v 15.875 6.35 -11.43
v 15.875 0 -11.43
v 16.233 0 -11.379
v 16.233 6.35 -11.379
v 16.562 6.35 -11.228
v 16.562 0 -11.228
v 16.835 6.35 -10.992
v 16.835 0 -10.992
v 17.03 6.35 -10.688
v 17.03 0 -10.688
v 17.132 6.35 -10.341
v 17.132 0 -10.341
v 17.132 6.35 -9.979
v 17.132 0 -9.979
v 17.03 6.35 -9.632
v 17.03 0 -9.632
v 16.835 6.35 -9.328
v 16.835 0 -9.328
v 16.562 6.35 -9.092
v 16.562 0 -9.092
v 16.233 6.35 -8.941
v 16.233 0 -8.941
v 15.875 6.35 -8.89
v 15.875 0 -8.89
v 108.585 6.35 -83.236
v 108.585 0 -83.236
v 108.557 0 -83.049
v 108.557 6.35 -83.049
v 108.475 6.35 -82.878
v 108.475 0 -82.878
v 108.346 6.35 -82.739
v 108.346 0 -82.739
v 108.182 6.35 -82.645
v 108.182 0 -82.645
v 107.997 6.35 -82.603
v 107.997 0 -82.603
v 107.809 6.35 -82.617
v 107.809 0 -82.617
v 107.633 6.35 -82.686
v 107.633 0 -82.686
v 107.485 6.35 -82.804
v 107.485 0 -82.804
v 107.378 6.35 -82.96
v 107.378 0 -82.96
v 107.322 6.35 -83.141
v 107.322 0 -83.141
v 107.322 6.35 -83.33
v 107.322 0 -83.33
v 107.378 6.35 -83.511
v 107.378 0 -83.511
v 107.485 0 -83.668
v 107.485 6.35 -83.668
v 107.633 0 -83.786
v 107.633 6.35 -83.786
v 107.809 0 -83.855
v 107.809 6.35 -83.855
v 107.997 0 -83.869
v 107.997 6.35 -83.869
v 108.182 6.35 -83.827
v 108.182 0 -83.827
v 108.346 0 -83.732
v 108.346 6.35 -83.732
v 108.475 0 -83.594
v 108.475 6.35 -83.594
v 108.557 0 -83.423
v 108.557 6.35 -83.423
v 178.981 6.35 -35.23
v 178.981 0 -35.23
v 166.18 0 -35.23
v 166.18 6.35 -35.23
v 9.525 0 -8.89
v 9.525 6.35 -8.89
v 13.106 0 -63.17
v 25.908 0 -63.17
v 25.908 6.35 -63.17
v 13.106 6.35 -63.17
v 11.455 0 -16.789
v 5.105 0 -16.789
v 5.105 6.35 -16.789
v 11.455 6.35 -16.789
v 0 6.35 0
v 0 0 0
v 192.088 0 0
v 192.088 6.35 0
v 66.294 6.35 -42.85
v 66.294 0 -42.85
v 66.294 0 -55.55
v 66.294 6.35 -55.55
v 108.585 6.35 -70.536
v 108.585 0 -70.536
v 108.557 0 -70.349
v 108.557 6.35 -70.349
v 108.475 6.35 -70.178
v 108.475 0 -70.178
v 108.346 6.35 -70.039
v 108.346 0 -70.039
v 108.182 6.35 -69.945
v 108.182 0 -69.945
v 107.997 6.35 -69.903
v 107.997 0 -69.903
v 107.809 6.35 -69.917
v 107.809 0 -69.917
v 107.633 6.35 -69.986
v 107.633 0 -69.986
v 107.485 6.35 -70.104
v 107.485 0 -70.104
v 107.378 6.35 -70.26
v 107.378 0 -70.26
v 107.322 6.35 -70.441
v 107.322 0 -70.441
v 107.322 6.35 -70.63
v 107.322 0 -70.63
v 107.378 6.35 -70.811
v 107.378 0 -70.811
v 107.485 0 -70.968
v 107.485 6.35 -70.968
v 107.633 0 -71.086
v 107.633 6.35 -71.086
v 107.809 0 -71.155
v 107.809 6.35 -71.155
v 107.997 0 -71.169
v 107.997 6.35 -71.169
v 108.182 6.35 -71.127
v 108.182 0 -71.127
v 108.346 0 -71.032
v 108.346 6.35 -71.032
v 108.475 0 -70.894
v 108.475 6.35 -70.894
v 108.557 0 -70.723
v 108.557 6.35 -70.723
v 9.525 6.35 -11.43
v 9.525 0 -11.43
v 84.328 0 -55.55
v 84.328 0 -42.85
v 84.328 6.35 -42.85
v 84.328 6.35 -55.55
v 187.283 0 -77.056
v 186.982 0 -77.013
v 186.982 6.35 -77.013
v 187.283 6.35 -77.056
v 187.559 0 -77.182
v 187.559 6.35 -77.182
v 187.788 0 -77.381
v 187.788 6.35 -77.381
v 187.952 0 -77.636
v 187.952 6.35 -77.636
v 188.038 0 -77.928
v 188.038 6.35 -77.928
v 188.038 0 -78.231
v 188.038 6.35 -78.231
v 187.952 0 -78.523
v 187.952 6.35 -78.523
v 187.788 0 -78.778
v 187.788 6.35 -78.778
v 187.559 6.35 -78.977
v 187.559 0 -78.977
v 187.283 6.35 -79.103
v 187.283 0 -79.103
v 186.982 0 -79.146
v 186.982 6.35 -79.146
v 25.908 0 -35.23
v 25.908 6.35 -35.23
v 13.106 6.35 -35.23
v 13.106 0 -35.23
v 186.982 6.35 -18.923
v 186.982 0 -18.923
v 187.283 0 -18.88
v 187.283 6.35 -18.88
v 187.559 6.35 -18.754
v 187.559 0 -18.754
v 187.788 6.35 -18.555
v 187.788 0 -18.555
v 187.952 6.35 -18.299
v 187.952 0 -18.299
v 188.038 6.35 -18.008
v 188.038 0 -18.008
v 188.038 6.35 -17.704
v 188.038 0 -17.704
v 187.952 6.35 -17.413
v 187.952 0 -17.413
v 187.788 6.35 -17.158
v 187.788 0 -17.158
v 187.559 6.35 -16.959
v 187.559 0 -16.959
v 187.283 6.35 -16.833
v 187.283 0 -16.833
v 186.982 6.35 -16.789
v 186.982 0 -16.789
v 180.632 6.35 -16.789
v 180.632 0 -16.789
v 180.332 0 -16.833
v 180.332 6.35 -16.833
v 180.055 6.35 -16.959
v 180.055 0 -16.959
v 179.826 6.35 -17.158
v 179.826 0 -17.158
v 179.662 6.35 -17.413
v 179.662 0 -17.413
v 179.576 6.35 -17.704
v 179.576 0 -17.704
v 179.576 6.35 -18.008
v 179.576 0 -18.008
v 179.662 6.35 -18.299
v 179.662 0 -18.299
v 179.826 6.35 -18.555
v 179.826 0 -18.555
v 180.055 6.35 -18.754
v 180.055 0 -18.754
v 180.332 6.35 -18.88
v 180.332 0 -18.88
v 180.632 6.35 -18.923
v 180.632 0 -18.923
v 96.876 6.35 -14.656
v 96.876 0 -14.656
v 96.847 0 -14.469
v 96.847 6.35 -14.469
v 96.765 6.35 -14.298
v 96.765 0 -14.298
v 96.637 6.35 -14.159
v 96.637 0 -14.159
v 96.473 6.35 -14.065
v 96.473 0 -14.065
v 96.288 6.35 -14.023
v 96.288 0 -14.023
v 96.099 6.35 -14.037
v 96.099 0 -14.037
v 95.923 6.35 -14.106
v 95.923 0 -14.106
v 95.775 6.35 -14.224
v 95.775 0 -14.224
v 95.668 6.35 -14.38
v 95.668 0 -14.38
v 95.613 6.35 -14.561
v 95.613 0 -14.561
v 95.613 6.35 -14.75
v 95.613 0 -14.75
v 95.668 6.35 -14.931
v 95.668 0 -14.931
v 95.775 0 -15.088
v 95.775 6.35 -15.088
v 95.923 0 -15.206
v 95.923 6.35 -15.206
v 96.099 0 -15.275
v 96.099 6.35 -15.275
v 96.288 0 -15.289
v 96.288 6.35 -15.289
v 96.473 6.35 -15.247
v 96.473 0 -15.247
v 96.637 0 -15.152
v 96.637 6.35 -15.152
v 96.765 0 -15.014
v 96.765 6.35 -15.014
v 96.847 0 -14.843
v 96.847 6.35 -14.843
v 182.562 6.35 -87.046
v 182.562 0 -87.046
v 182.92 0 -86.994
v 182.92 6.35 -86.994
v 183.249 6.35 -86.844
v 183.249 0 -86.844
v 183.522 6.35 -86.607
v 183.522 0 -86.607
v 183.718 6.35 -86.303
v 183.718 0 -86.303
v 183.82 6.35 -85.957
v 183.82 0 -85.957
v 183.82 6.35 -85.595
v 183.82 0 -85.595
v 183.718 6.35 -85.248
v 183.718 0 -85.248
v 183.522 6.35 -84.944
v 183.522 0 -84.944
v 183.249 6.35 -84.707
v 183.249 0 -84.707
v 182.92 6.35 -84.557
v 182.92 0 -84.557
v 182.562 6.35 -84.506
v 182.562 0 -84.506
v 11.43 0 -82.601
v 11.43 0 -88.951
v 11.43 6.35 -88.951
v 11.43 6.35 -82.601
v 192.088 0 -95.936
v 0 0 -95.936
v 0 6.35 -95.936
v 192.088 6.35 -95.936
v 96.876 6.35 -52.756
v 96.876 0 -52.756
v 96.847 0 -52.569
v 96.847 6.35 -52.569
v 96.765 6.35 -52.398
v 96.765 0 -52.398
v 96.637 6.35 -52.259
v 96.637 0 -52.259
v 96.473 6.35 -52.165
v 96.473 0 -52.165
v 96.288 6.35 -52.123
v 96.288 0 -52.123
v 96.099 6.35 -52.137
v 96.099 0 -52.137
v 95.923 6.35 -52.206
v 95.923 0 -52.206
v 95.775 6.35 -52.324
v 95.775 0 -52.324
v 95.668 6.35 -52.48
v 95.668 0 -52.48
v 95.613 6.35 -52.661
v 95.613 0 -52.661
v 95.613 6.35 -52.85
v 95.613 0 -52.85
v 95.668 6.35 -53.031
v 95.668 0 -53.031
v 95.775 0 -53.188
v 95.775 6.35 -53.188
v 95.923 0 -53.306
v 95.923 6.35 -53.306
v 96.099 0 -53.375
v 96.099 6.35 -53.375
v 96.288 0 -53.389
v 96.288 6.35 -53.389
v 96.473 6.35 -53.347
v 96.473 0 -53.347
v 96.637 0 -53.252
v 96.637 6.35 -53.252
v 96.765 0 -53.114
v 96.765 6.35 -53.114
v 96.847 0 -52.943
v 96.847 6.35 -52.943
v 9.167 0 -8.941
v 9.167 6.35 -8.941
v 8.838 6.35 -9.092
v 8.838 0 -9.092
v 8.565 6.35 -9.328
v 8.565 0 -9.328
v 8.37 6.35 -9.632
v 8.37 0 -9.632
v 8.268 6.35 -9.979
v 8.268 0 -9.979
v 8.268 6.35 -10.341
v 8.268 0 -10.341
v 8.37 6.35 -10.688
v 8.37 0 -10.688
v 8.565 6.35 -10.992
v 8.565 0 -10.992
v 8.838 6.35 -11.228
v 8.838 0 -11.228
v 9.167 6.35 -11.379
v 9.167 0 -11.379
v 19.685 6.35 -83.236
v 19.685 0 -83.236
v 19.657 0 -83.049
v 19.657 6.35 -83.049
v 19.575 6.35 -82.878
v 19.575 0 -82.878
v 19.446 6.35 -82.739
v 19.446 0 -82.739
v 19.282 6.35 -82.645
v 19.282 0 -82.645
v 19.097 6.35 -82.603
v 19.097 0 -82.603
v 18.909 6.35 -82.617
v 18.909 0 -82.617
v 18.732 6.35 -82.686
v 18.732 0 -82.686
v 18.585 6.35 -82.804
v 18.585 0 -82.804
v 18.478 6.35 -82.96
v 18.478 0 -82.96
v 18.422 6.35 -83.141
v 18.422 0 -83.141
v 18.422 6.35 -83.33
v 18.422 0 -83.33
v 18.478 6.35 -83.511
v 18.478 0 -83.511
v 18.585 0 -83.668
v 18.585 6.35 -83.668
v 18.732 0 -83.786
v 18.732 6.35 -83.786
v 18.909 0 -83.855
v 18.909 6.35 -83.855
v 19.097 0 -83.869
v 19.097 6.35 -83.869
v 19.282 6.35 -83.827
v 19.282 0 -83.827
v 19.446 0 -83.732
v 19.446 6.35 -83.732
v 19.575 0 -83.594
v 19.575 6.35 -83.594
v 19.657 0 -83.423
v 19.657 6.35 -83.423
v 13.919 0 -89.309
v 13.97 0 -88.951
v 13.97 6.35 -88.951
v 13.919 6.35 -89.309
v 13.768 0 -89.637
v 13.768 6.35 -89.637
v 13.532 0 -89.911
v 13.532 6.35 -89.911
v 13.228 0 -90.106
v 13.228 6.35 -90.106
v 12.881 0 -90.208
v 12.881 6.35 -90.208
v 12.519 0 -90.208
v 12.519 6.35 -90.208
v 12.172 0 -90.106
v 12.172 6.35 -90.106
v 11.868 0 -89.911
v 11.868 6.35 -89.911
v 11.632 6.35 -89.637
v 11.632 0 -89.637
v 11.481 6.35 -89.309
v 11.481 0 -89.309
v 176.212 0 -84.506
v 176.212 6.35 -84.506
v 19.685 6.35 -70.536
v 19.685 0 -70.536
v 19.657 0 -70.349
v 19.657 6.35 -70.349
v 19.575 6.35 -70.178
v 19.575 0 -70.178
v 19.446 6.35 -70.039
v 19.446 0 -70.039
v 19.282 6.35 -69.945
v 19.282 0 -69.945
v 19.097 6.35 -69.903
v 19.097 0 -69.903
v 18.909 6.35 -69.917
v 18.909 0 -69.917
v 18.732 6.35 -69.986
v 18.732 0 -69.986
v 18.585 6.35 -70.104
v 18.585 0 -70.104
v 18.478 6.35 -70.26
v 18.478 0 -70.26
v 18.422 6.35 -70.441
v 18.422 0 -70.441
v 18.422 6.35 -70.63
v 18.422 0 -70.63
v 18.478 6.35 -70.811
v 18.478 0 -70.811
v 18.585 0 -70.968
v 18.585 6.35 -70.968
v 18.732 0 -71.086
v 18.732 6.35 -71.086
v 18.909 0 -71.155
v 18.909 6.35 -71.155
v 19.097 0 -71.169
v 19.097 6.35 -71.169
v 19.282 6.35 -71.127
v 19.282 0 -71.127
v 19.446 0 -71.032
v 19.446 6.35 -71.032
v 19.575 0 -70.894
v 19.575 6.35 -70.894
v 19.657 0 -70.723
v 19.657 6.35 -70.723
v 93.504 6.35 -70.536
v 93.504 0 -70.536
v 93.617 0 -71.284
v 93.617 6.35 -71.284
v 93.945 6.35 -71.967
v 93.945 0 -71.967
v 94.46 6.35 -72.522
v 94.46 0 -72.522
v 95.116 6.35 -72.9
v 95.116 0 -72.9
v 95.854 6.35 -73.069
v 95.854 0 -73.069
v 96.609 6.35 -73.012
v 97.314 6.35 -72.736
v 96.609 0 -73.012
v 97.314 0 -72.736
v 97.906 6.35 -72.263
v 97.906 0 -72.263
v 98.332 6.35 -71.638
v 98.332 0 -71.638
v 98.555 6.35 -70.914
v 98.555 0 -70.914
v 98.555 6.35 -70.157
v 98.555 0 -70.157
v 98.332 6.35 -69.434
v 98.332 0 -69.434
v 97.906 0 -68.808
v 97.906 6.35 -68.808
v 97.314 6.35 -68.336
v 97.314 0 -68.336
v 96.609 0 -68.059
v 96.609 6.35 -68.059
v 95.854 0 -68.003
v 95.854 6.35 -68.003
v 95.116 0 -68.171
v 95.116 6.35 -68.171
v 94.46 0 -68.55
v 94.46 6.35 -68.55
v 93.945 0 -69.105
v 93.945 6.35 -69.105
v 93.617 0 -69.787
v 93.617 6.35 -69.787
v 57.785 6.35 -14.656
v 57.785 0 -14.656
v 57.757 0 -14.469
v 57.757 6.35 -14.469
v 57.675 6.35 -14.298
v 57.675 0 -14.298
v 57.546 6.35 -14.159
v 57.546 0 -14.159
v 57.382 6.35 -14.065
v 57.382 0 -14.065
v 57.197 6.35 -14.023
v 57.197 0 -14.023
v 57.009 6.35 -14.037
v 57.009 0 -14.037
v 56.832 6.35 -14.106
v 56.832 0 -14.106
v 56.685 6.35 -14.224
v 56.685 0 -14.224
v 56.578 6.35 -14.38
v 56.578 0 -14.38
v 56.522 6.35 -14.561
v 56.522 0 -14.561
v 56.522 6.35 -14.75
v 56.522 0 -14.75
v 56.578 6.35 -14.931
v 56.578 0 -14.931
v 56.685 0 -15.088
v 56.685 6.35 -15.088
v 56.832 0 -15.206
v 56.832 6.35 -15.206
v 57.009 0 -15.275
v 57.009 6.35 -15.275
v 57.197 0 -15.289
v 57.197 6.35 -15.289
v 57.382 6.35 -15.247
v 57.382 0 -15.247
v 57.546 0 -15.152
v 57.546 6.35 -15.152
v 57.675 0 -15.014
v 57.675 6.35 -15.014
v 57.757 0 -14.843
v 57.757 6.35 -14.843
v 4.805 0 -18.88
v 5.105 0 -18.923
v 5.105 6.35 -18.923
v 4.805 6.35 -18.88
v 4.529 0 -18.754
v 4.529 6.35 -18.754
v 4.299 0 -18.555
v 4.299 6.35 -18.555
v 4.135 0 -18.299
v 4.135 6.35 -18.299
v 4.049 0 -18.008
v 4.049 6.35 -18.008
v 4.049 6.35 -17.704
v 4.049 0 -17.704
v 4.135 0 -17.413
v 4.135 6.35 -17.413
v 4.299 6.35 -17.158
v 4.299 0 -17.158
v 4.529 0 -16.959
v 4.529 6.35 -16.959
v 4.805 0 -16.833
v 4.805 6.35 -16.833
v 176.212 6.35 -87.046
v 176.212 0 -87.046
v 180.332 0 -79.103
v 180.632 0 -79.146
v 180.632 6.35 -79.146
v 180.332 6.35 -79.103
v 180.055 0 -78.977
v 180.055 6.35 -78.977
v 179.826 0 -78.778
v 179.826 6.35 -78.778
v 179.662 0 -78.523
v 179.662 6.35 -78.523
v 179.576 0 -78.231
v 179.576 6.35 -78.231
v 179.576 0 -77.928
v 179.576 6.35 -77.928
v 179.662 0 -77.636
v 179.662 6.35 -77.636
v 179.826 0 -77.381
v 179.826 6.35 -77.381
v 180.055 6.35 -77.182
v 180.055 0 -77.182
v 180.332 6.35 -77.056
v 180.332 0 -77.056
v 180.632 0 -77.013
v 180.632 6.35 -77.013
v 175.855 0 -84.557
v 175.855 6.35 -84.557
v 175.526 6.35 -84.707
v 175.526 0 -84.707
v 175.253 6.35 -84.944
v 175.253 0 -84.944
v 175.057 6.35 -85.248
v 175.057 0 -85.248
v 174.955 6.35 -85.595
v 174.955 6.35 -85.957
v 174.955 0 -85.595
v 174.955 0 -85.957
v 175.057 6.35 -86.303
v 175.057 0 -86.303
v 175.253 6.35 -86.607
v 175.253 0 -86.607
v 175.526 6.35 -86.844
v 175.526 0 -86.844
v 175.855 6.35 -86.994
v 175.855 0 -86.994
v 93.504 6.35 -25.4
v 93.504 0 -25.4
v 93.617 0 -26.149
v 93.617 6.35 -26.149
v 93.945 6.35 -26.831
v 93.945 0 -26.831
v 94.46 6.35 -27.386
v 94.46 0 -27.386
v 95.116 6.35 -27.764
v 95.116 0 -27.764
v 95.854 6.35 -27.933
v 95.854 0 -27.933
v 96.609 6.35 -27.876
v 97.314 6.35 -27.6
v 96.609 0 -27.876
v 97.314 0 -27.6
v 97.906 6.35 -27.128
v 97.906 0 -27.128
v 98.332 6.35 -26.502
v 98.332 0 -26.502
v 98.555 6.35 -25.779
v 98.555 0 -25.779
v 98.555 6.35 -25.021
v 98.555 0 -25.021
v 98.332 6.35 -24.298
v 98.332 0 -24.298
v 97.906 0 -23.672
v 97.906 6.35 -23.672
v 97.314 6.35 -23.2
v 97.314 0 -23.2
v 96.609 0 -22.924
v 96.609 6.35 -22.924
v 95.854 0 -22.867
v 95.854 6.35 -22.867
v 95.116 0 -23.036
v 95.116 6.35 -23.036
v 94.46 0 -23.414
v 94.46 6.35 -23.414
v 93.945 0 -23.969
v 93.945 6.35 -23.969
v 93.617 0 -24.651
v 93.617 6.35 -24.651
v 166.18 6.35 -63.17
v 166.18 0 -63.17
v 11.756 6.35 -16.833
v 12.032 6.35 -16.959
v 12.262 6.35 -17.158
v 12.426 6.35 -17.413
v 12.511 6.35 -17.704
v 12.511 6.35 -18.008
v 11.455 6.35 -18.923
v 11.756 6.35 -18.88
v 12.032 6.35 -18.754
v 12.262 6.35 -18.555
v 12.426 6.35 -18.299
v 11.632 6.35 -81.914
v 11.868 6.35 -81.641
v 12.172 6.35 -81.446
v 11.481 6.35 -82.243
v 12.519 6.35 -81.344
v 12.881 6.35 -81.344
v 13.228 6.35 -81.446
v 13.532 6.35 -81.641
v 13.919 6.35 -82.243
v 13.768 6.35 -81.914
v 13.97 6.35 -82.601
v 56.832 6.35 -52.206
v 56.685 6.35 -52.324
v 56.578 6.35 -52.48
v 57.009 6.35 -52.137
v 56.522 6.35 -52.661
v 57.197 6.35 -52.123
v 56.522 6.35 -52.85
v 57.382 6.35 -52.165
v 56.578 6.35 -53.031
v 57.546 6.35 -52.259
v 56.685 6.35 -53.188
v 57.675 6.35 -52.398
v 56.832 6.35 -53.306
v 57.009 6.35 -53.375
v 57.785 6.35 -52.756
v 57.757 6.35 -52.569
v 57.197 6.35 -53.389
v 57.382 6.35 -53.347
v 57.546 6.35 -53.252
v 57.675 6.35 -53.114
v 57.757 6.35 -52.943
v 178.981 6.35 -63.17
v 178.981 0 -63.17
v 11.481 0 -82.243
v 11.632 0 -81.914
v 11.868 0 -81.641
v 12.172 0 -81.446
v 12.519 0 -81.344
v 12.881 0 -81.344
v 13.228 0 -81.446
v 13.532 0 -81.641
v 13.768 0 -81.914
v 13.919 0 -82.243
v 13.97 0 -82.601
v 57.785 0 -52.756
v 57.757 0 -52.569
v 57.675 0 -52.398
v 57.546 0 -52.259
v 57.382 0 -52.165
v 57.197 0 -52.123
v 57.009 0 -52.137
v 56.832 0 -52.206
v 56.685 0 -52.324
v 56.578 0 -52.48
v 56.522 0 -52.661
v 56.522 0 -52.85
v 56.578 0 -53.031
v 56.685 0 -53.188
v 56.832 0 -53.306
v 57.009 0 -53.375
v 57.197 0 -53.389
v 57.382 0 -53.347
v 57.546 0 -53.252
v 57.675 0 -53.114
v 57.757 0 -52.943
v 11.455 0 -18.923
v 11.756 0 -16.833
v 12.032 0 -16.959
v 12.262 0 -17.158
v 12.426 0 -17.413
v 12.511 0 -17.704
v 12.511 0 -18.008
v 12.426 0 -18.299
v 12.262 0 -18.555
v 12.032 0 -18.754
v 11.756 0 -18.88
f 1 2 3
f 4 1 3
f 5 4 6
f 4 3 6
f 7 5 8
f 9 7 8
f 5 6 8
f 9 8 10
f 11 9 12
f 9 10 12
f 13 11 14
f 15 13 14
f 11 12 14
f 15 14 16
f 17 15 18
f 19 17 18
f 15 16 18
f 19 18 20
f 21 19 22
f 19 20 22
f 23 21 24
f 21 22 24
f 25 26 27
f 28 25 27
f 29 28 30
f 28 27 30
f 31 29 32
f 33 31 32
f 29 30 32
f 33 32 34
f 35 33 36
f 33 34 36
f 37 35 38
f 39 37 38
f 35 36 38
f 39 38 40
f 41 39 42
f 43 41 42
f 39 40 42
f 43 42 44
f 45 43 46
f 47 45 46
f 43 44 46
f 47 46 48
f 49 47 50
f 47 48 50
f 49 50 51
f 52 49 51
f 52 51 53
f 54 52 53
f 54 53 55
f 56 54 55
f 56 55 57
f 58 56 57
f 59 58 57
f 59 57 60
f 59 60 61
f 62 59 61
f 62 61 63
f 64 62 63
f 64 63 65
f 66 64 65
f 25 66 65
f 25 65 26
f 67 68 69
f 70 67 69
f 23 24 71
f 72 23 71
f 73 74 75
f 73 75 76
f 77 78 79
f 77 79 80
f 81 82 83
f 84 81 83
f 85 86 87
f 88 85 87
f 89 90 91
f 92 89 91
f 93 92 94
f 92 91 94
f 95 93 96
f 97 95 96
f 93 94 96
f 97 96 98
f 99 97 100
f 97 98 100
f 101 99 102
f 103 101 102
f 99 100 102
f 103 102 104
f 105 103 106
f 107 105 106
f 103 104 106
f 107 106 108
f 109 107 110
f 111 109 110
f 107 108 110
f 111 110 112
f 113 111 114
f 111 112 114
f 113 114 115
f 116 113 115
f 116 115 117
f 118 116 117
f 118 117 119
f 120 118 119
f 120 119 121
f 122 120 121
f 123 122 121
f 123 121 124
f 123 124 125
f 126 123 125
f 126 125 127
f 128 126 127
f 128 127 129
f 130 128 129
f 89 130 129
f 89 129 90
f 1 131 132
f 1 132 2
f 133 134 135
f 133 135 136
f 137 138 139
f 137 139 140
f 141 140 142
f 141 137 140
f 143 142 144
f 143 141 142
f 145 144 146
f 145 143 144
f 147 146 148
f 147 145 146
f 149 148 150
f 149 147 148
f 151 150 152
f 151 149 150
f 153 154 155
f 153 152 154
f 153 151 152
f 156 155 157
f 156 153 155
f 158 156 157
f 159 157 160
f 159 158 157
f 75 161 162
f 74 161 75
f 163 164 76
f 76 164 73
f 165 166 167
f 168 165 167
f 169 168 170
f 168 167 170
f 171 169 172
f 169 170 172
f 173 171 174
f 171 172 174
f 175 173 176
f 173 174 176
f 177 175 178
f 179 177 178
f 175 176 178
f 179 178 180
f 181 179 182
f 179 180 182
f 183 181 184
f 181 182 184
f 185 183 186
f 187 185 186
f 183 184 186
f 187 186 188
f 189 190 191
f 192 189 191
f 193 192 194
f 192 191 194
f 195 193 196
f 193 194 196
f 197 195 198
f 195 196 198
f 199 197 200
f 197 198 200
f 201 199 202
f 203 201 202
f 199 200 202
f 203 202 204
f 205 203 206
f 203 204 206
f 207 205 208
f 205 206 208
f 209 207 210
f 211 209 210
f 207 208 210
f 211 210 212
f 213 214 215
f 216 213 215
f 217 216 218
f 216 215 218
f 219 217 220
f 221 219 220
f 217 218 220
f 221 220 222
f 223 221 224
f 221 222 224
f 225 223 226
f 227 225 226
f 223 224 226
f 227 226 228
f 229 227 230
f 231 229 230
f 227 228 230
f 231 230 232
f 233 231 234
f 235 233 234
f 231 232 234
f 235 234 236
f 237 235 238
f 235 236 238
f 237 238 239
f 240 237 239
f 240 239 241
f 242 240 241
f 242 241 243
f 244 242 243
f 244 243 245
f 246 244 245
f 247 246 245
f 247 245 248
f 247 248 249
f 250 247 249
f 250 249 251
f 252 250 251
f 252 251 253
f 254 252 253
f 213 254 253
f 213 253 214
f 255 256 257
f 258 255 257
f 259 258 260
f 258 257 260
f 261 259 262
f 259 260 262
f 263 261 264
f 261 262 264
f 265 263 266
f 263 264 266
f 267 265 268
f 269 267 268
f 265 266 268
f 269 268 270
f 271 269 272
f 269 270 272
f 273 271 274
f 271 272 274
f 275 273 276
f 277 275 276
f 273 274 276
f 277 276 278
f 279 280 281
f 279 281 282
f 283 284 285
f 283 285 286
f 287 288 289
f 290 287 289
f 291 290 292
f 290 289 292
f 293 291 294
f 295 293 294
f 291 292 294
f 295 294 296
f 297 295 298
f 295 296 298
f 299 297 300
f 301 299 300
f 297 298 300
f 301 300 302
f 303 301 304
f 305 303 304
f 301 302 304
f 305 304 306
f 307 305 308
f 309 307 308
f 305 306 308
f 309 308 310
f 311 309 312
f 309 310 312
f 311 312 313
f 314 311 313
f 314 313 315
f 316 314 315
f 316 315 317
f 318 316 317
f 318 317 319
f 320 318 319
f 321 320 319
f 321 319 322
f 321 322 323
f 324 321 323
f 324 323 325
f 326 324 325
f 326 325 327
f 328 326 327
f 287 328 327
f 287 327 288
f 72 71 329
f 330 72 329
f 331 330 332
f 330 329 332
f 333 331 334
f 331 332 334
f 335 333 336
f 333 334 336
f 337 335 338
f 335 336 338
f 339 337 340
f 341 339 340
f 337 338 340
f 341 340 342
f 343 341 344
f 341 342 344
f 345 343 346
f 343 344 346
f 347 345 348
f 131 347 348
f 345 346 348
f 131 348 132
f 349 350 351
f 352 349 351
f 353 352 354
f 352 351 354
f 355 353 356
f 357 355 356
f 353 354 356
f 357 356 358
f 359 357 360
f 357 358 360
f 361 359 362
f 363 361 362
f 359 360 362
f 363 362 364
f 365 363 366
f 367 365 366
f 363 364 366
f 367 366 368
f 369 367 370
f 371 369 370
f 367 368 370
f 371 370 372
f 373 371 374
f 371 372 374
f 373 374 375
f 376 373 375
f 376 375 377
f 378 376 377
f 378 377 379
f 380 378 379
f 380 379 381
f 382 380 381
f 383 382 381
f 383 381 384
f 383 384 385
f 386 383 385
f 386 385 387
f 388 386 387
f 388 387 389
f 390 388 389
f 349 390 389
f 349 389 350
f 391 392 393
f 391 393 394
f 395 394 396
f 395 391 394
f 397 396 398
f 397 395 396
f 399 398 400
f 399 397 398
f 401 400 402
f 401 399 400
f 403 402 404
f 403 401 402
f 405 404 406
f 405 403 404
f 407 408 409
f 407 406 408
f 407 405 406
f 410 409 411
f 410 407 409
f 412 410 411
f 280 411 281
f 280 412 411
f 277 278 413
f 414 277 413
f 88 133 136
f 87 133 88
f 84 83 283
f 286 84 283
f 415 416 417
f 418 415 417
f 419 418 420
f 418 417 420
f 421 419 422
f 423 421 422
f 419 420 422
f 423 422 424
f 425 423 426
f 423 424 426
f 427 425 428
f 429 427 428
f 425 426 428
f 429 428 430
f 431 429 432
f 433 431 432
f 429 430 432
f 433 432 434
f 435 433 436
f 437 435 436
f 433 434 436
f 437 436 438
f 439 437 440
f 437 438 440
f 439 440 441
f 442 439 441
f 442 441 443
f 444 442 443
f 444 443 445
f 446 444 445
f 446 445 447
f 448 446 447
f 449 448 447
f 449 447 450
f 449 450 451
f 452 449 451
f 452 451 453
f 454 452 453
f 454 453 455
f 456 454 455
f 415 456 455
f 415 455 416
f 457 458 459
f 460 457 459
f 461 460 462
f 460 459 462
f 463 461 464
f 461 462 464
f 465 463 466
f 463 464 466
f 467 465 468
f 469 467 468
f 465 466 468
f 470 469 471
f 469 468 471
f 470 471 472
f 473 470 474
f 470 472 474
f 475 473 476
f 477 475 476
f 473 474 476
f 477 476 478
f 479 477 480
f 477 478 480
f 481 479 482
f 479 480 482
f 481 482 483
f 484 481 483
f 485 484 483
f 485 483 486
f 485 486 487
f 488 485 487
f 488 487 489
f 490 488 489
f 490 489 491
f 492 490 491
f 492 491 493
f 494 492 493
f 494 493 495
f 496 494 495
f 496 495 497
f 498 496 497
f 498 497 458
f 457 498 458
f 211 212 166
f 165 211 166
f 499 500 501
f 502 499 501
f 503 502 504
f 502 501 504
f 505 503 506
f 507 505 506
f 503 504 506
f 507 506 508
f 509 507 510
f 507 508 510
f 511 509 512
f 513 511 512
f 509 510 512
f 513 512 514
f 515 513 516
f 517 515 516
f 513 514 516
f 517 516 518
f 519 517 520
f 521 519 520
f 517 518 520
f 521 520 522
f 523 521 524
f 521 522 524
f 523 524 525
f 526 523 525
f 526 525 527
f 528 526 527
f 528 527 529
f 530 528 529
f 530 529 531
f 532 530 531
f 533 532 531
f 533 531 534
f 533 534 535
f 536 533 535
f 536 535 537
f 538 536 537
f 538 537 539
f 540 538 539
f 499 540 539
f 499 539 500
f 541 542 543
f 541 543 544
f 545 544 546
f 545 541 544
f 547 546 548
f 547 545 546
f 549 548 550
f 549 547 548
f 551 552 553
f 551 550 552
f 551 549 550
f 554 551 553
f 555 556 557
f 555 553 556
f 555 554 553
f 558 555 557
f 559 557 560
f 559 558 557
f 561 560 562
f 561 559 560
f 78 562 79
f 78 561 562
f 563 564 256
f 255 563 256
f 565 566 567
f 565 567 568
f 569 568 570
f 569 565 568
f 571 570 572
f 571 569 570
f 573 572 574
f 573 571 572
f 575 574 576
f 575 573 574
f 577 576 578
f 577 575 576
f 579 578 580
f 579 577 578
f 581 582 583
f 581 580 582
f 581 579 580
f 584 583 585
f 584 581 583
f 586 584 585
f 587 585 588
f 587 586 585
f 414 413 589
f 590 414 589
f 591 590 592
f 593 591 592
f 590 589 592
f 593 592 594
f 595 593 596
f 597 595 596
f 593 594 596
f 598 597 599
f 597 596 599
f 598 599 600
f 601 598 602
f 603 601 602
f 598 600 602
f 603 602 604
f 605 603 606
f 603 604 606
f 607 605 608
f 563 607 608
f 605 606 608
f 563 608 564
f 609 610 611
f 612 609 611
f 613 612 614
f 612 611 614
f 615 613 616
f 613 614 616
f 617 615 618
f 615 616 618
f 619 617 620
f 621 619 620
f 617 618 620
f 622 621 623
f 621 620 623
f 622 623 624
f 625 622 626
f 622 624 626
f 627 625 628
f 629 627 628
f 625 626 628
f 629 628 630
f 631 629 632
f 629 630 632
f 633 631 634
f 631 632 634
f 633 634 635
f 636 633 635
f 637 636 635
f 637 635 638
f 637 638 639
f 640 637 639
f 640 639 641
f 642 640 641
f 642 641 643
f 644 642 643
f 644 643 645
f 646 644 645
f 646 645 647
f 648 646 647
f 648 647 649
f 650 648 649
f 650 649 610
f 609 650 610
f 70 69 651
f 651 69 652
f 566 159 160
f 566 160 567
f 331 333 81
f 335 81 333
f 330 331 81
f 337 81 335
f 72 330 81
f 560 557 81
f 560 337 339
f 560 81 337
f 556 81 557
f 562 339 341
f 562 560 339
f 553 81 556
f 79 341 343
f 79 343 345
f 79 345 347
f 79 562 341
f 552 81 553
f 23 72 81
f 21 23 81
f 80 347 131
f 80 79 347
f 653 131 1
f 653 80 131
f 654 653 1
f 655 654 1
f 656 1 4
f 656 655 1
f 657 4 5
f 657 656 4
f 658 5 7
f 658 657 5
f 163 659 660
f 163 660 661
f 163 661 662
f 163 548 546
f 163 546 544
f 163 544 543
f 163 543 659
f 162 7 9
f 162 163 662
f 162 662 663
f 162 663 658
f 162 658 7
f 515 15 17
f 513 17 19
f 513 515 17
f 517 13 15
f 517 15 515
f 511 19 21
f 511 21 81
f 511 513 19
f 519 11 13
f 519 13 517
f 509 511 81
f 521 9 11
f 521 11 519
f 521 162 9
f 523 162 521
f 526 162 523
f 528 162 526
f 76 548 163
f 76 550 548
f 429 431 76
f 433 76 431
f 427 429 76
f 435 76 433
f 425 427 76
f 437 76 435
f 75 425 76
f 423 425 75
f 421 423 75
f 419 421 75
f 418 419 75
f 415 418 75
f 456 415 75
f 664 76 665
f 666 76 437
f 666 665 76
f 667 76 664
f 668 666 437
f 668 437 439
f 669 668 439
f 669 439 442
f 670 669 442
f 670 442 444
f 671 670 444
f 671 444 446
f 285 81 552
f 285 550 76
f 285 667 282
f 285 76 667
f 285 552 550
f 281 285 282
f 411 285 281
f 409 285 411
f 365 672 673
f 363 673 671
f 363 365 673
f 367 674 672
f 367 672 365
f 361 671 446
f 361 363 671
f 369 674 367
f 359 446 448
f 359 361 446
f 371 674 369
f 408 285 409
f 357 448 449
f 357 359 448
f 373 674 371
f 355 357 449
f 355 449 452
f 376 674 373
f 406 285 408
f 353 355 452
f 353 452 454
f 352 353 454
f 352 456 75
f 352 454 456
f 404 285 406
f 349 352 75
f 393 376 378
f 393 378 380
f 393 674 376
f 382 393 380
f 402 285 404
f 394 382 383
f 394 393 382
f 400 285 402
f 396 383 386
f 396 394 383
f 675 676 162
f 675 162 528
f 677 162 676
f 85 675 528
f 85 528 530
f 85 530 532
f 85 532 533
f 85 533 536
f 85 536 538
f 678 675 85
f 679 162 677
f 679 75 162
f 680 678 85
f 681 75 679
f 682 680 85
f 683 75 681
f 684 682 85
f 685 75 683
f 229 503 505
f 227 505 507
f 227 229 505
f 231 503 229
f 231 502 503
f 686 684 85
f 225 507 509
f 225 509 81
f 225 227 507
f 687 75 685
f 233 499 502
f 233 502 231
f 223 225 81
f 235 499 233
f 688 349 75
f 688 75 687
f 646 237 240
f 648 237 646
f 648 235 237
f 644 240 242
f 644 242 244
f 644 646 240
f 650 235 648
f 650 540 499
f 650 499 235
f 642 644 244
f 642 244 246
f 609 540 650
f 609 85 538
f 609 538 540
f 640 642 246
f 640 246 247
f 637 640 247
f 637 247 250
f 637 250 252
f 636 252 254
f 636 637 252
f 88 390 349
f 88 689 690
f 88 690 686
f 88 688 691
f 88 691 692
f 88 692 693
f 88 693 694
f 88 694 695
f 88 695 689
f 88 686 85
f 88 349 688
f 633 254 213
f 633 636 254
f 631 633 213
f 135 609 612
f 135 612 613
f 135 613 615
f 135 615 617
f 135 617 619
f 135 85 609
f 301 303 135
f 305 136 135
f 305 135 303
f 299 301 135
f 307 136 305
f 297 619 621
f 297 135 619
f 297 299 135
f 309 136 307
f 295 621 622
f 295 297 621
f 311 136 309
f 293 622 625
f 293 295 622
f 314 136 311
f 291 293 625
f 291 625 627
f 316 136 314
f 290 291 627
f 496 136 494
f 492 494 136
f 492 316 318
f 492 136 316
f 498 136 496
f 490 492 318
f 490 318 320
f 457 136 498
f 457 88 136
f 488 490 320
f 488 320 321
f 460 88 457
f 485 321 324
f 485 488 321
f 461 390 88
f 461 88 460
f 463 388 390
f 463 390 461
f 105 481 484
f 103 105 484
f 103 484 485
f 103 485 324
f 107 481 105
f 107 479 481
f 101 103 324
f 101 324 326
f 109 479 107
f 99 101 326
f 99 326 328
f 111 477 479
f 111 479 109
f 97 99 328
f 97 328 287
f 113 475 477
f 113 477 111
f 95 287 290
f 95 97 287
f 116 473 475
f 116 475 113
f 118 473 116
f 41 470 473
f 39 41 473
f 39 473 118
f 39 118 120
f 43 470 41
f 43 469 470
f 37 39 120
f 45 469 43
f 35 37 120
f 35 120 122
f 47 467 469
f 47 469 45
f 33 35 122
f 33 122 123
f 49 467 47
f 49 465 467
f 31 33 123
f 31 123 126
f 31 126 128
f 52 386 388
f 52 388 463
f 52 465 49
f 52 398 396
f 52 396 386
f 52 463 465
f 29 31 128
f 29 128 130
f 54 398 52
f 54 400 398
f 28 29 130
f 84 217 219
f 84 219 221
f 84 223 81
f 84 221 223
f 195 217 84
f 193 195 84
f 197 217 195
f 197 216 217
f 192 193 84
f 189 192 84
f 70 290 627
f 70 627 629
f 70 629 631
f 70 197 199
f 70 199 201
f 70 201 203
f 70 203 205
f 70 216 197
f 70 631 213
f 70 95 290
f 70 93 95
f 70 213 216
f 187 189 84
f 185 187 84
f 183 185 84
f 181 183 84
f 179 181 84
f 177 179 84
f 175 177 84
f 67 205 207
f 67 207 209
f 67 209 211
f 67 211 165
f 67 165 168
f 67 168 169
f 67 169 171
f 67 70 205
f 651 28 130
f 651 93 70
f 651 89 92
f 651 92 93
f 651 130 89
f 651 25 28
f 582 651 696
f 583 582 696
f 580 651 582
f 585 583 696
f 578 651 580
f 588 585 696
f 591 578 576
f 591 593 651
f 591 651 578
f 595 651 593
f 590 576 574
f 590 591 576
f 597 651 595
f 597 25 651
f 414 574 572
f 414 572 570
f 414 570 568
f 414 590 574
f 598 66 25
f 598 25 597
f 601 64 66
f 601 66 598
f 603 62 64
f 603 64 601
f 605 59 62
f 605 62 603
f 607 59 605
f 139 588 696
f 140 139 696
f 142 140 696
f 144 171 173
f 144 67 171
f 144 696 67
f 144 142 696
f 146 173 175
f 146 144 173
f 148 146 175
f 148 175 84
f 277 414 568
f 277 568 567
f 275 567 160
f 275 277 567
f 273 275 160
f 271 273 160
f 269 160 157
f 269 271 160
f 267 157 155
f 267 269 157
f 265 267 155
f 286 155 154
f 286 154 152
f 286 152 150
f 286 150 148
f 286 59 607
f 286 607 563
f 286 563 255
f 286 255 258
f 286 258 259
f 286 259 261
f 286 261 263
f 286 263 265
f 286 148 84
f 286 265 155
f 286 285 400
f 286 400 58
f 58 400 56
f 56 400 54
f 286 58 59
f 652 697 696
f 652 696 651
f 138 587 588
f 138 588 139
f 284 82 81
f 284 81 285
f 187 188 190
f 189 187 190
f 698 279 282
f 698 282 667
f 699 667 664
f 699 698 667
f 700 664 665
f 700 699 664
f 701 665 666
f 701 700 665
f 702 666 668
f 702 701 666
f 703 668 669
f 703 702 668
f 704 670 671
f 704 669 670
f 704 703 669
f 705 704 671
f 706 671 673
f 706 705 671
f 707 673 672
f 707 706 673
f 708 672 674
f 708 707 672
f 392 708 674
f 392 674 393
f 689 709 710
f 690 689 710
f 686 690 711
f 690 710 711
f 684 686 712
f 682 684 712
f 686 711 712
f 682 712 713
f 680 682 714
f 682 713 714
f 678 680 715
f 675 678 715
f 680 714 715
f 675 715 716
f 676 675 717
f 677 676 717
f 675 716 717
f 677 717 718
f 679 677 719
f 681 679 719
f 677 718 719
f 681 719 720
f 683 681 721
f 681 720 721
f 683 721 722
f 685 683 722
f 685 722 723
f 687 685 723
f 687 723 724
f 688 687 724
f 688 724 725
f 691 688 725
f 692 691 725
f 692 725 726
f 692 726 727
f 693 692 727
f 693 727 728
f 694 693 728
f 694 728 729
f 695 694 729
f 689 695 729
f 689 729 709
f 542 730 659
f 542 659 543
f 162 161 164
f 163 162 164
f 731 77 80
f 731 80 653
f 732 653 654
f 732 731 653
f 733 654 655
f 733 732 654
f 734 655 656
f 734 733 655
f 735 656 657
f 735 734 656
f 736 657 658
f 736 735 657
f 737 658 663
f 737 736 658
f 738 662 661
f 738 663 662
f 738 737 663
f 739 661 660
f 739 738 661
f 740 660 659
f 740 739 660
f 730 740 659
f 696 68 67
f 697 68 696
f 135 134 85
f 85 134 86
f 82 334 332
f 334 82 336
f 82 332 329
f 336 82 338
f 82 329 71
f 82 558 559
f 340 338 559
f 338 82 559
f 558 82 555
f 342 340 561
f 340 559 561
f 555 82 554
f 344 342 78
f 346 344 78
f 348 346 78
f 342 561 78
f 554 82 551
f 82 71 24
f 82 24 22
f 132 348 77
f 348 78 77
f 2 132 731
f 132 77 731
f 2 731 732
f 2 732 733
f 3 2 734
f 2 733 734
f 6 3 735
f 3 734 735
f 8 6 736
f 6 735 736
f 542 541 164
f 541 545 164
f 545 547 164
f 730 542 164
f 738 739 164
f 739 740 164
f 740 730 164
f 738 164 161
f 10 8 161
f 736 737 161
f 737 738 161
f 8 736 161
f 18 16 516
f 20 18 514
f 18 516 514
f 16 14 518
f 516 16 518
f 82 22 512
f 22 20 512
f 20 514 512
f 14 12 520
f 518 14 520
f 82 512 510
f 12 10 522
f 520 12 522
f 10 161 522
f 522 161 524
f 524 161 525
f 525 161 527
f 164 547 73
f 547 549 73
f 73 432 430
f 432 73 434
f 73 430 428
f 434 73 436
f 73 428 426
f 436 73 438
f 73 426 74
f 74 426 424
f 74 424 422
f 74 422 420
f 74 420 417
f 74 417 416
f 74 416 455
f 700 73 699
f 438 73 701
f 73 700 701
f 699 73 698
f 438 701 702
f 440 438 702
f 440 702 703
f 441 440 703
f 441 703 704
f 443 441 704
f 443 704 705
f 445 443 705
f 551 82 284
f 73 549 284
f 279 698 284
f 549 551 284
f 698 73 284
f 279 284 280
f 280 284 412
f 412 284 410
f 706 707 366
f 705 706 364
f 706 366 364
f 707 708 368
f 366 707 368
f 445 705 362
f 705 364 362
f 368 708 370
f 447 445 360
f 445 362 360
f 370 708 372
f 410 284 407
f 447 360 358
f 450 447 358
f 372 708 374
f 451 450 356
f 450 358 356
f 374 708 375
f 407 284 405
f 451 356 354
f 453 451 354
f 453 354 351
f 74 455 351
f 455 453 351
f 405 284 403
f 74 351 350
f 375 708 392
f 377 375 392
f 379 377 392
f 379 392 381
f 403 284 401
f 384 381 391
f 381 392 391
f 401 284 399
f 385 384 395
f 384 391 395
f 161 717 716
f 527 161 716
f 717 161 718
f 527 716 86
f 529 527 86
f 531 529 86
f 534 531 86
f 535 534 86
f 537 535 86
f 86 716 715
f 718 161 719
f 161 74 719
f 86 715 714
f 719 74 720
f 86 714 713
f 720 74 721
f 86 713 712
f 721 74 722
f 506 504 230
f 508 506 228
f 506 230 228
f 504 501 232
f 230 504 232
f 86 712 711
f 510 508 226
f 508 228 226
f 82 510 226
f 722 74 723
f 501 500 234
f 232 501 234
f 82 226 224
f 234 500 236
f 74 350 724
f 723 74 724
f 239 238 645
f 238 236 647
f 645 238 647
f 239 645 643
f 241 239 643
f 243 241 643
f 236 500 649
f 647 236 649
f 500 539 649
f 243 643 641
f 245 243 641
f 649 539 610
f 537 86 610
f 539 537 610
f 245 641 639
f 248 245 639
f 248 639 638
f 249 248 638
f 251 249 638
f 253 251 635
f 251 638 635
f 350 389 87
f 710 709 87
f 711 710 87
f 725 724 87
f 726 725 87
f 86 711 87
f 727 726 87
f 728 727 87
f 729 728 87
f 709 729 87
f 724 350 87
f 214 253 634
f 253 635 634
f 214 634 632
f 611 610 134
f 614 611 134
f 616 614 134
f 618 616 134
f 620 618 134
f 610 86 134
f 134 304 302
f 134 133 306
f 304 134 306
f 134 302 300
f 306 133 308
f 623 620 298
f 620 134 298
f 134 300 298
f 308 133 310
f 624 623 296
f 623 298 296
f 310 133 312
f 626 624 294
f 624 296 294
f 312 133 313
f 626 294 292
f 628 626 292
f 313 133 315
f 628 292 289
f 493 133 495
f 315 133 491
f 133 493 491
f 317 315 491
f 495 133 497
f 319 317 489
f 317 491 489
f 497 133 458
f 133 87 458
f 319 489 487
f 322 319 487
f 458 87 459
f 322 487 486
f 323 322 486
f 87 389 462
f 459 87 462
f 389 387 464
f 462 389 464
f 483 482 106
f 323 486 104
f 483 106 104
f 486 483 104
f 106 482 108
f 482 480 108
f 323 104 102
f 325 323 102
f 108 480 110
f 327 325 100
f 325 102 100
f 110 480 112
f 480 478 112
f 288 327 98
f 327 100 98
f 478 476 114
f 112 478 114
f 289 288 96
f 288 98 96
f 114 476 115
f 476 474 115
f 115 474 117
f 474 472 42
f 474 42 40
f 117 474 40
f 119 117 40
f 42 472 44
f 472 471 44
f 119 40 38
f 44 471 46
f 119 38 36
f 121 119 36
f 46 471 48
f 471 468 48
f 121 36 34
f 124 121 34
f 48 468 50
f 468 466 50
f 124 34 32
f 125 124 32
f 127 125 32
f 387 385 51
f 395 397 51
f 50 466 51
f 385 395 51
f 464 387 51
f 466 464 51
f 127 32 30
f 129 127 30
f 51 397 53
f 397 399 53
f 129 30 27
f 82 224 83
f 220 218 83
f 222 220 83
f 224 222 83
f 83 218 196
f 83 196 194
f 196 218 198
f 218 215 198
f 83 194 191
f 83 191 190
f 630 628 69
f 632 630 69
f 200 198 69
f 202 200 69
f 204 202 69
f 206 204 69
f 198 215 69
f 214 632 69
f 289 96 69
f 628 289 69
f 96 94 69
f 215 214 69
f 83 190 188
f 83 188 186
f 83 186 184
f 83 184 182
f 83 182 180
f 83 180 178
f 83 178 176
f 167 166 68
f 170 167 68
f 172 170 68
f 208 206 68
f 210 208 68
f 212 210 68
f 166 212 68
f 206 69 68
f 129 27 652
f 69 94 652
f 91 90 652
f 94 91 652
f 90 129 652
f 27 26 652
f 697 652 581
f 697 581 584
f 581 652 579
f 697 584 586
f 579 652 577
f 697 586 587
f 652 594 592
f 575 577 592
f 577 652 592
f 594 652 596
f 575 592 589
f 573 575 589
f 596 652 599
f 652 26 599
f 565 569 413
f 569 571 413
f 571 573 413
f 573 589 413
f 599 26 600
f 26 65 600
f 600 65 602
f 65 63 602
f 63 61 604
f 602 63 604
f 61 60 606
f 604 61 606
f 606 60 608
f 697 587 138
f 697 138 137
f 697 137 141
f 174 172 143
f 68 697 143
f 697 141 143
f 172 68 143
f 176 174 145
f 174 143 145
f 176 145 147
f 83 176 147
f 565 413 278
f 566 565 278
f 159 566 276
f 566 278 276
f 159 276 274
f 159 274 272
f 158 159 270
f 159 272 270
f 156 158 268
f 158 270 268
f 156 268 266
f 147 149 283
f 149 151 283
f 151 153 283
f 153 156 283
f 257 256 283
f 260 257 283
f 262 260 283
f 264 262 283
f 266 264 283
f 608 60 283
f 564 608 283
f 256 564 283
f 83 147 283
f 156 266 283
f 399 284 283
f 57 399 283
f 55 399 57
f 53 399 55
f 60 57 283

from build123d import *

# Parameters (mm, degrees)
SKETCH1_W           = 192.0875
SKETCH1_H           = 95.9358
BOSS_EXTRUDE1_DEPTH = 6.35
SKETCH8_R           = 0.635
CUT_EXTRUDE2_DEPTH  = 20.05
SKETCH3_R           = 2.54
SKETCH3_W           = 12.8016
SKETCH3_H           = 27.94
SKETCH3_W_2         = 18.034
SKETCH3_H_2         = 12.7
CUT_EXTRUDE3_DEPTH  = 7.35


with BuildPart() as part:
    # Sketch1 → Boss-Extrude1 (new body)
    with BuildSketch(Plane(origin=(0, 0, 0), x_dir=(1, 0, 0), z_dir=(0, 1, 0))):
        with Locations((96.04375, 47.9679)):
            Rectangle(SKETCH1_W, SKETCH1_H)
    extrude(amount=BOSS_EXTRUDE1_DEPTH)

    # Sketch8 → Cut-Extrude2 (cut, through all)
    with BuildSketch(Plane.XZ.offset(12.7)):
        with Locations((19.05, 5.6642)):
            Circle(SKETCH8_R)
        with Locations((19.05, 18.3642)):
            Circle(SKETCH8_R)
        with Locations((19.05, -70.5358)):
            Circle(SKETCH8_R)
        with Locations((19.05, -83.2358)):
            Circle(SKETCH8_R)
        with Locations((57.15, -52.7558)):
            Circle(SKETCH8_R)
        with Locations((57.15, -14.6558)):
            Circle(SKETCH8_R)
        with Locations((96.2406, -14.6558)):
            Circle(SKETCH8_R)
        with Locations((96.2406, -52.7558)):
            Circle(SKETCH8_R)
        with Locations((107.95, -83.2358)):
            Circle(SKETCH8_R)
        with Locations((107.95, -70.5358)):
            Circle(SKETCH8_R)
        with Locations((107.95, 5.6642)):
            Circle(SKETCH8_R)
        with Locations((107.95, 18.3642)):
            Circle(SKETCH8_R)
    extrude(amount=-CUT_EXTRUDE2_DEPTH, mode=Mode.SUBTRACT)

    # Sketch3 → Cut-Extrude3 (cut, through all)
    with BuildSketch(Plane(origin=(0, 0, 0), x_dir=(-1, 0, 0), z_dir=(0, -1, 0))):
        with Locations((-96.04375, 25.4)):
            Circle(SKETCH3_R)
        with Locations((-96.04375, 70.5358)):
            Circle(SKETCH3_R)
        with BuildLine():
            Line((-11.43, 88.9508), (-11.43, 82.6008))
            ThreePointArc((-11.43, 82.6008), (-12.7, 81.3308), (-13.97, 82.6008))
            Line((-13.97, 82.6008), (-13.97, 88.9508))
            ThreePointArc((-13.97, 88.9508), (-12.7, 90.2208), (-11.43, 88.9508))
        make_face()
        with BuildLine():
            Line((-182.5625, 84.5058), (-176.2125, 84.5058))
            ThreePointArc((-176.2125, 84.5058), (-174.9425, 85.7758), (-176.2125, 87.0458))
            Line((-176.2125, 87.0458), (-182.5625, 87.0458))
            ThreePointArc((-182.5625, 87.0458), (-183.8325, 85.7758), (-182.5625, 84.5058))
        make_face()
        with BuildLine():
            Line((-9.525, 11.43), (-15.875, 11.43))
            ThreePointArc((-15.875, 11.43), (-17.145, 10.16), (-15.875, 8.89))
            Line((-15.875, 8.89), (-9.525, 8.89))
            ThreePointArc((-9.525, 8.89), (-8.255, 10.16), (-9.525, 11.43))
        make_face()
        with BuildLine():
            Line((-5.1054, 16.7894), (-11.4554, 16.7894))
            ThreePointArc((-11.4554, 16.7894), (-12.5222, 17.8562), (-11.4554, 18.923))
            Line((-11.4554, 18.923), (-5.1054, 18.923))
            ThreePointArc((-5.1054, 18.923), (-4.0386, 17.8562), (-5.1054, 16.7894))
        make_face()
        with BuildLine():
            Line((-186.9821, 16.7894), (-180.6321, 16.7894))
            ThreePointArc((-180.6321, 16.7894), (-179.5653, 17.8562), (-180.6321, 18.923))
            Line((-180.6321, 18.923), (-186.9821, 18.923))
            ThreePointArc((-186.9821, 18.923), (-188.0489, 17.8562), (-186.9821, 16.7894))
        make_face()
        with Locations((-172.5803, 49.1998)):
            Rectangle(SKETCH3_W, SKETCH3_H)
        with Locations((-19.5072, 49.1998)):
            Rectangle(SKETCH3_W, SKETCH3_H)
        with BuildLine():
            Line((-186.9821, 79.1464), (-180.6321, 79.1464))
            ThreePointArc((-180.6321, 79.1464), (-179.5653, 78.0796), (-180.6321, 77.0128))
            Line((-180.6321, 77.0128), (-186.9821, 77.0128))
            ThreePointArc((-186.9821, 77.0128), (-188.0489, 78.0796), (-186.9821, 79.1464))
        make_face()
        with Locations((-75.311, 49.1998)):
            Rectangle(SKETCH3_W_2, SKETCH3_H_2)
    extrude(amount=-CUT_EXTRUDE3_DEPTH, mode=Mode.SUBTRACT)


solid = part.part
